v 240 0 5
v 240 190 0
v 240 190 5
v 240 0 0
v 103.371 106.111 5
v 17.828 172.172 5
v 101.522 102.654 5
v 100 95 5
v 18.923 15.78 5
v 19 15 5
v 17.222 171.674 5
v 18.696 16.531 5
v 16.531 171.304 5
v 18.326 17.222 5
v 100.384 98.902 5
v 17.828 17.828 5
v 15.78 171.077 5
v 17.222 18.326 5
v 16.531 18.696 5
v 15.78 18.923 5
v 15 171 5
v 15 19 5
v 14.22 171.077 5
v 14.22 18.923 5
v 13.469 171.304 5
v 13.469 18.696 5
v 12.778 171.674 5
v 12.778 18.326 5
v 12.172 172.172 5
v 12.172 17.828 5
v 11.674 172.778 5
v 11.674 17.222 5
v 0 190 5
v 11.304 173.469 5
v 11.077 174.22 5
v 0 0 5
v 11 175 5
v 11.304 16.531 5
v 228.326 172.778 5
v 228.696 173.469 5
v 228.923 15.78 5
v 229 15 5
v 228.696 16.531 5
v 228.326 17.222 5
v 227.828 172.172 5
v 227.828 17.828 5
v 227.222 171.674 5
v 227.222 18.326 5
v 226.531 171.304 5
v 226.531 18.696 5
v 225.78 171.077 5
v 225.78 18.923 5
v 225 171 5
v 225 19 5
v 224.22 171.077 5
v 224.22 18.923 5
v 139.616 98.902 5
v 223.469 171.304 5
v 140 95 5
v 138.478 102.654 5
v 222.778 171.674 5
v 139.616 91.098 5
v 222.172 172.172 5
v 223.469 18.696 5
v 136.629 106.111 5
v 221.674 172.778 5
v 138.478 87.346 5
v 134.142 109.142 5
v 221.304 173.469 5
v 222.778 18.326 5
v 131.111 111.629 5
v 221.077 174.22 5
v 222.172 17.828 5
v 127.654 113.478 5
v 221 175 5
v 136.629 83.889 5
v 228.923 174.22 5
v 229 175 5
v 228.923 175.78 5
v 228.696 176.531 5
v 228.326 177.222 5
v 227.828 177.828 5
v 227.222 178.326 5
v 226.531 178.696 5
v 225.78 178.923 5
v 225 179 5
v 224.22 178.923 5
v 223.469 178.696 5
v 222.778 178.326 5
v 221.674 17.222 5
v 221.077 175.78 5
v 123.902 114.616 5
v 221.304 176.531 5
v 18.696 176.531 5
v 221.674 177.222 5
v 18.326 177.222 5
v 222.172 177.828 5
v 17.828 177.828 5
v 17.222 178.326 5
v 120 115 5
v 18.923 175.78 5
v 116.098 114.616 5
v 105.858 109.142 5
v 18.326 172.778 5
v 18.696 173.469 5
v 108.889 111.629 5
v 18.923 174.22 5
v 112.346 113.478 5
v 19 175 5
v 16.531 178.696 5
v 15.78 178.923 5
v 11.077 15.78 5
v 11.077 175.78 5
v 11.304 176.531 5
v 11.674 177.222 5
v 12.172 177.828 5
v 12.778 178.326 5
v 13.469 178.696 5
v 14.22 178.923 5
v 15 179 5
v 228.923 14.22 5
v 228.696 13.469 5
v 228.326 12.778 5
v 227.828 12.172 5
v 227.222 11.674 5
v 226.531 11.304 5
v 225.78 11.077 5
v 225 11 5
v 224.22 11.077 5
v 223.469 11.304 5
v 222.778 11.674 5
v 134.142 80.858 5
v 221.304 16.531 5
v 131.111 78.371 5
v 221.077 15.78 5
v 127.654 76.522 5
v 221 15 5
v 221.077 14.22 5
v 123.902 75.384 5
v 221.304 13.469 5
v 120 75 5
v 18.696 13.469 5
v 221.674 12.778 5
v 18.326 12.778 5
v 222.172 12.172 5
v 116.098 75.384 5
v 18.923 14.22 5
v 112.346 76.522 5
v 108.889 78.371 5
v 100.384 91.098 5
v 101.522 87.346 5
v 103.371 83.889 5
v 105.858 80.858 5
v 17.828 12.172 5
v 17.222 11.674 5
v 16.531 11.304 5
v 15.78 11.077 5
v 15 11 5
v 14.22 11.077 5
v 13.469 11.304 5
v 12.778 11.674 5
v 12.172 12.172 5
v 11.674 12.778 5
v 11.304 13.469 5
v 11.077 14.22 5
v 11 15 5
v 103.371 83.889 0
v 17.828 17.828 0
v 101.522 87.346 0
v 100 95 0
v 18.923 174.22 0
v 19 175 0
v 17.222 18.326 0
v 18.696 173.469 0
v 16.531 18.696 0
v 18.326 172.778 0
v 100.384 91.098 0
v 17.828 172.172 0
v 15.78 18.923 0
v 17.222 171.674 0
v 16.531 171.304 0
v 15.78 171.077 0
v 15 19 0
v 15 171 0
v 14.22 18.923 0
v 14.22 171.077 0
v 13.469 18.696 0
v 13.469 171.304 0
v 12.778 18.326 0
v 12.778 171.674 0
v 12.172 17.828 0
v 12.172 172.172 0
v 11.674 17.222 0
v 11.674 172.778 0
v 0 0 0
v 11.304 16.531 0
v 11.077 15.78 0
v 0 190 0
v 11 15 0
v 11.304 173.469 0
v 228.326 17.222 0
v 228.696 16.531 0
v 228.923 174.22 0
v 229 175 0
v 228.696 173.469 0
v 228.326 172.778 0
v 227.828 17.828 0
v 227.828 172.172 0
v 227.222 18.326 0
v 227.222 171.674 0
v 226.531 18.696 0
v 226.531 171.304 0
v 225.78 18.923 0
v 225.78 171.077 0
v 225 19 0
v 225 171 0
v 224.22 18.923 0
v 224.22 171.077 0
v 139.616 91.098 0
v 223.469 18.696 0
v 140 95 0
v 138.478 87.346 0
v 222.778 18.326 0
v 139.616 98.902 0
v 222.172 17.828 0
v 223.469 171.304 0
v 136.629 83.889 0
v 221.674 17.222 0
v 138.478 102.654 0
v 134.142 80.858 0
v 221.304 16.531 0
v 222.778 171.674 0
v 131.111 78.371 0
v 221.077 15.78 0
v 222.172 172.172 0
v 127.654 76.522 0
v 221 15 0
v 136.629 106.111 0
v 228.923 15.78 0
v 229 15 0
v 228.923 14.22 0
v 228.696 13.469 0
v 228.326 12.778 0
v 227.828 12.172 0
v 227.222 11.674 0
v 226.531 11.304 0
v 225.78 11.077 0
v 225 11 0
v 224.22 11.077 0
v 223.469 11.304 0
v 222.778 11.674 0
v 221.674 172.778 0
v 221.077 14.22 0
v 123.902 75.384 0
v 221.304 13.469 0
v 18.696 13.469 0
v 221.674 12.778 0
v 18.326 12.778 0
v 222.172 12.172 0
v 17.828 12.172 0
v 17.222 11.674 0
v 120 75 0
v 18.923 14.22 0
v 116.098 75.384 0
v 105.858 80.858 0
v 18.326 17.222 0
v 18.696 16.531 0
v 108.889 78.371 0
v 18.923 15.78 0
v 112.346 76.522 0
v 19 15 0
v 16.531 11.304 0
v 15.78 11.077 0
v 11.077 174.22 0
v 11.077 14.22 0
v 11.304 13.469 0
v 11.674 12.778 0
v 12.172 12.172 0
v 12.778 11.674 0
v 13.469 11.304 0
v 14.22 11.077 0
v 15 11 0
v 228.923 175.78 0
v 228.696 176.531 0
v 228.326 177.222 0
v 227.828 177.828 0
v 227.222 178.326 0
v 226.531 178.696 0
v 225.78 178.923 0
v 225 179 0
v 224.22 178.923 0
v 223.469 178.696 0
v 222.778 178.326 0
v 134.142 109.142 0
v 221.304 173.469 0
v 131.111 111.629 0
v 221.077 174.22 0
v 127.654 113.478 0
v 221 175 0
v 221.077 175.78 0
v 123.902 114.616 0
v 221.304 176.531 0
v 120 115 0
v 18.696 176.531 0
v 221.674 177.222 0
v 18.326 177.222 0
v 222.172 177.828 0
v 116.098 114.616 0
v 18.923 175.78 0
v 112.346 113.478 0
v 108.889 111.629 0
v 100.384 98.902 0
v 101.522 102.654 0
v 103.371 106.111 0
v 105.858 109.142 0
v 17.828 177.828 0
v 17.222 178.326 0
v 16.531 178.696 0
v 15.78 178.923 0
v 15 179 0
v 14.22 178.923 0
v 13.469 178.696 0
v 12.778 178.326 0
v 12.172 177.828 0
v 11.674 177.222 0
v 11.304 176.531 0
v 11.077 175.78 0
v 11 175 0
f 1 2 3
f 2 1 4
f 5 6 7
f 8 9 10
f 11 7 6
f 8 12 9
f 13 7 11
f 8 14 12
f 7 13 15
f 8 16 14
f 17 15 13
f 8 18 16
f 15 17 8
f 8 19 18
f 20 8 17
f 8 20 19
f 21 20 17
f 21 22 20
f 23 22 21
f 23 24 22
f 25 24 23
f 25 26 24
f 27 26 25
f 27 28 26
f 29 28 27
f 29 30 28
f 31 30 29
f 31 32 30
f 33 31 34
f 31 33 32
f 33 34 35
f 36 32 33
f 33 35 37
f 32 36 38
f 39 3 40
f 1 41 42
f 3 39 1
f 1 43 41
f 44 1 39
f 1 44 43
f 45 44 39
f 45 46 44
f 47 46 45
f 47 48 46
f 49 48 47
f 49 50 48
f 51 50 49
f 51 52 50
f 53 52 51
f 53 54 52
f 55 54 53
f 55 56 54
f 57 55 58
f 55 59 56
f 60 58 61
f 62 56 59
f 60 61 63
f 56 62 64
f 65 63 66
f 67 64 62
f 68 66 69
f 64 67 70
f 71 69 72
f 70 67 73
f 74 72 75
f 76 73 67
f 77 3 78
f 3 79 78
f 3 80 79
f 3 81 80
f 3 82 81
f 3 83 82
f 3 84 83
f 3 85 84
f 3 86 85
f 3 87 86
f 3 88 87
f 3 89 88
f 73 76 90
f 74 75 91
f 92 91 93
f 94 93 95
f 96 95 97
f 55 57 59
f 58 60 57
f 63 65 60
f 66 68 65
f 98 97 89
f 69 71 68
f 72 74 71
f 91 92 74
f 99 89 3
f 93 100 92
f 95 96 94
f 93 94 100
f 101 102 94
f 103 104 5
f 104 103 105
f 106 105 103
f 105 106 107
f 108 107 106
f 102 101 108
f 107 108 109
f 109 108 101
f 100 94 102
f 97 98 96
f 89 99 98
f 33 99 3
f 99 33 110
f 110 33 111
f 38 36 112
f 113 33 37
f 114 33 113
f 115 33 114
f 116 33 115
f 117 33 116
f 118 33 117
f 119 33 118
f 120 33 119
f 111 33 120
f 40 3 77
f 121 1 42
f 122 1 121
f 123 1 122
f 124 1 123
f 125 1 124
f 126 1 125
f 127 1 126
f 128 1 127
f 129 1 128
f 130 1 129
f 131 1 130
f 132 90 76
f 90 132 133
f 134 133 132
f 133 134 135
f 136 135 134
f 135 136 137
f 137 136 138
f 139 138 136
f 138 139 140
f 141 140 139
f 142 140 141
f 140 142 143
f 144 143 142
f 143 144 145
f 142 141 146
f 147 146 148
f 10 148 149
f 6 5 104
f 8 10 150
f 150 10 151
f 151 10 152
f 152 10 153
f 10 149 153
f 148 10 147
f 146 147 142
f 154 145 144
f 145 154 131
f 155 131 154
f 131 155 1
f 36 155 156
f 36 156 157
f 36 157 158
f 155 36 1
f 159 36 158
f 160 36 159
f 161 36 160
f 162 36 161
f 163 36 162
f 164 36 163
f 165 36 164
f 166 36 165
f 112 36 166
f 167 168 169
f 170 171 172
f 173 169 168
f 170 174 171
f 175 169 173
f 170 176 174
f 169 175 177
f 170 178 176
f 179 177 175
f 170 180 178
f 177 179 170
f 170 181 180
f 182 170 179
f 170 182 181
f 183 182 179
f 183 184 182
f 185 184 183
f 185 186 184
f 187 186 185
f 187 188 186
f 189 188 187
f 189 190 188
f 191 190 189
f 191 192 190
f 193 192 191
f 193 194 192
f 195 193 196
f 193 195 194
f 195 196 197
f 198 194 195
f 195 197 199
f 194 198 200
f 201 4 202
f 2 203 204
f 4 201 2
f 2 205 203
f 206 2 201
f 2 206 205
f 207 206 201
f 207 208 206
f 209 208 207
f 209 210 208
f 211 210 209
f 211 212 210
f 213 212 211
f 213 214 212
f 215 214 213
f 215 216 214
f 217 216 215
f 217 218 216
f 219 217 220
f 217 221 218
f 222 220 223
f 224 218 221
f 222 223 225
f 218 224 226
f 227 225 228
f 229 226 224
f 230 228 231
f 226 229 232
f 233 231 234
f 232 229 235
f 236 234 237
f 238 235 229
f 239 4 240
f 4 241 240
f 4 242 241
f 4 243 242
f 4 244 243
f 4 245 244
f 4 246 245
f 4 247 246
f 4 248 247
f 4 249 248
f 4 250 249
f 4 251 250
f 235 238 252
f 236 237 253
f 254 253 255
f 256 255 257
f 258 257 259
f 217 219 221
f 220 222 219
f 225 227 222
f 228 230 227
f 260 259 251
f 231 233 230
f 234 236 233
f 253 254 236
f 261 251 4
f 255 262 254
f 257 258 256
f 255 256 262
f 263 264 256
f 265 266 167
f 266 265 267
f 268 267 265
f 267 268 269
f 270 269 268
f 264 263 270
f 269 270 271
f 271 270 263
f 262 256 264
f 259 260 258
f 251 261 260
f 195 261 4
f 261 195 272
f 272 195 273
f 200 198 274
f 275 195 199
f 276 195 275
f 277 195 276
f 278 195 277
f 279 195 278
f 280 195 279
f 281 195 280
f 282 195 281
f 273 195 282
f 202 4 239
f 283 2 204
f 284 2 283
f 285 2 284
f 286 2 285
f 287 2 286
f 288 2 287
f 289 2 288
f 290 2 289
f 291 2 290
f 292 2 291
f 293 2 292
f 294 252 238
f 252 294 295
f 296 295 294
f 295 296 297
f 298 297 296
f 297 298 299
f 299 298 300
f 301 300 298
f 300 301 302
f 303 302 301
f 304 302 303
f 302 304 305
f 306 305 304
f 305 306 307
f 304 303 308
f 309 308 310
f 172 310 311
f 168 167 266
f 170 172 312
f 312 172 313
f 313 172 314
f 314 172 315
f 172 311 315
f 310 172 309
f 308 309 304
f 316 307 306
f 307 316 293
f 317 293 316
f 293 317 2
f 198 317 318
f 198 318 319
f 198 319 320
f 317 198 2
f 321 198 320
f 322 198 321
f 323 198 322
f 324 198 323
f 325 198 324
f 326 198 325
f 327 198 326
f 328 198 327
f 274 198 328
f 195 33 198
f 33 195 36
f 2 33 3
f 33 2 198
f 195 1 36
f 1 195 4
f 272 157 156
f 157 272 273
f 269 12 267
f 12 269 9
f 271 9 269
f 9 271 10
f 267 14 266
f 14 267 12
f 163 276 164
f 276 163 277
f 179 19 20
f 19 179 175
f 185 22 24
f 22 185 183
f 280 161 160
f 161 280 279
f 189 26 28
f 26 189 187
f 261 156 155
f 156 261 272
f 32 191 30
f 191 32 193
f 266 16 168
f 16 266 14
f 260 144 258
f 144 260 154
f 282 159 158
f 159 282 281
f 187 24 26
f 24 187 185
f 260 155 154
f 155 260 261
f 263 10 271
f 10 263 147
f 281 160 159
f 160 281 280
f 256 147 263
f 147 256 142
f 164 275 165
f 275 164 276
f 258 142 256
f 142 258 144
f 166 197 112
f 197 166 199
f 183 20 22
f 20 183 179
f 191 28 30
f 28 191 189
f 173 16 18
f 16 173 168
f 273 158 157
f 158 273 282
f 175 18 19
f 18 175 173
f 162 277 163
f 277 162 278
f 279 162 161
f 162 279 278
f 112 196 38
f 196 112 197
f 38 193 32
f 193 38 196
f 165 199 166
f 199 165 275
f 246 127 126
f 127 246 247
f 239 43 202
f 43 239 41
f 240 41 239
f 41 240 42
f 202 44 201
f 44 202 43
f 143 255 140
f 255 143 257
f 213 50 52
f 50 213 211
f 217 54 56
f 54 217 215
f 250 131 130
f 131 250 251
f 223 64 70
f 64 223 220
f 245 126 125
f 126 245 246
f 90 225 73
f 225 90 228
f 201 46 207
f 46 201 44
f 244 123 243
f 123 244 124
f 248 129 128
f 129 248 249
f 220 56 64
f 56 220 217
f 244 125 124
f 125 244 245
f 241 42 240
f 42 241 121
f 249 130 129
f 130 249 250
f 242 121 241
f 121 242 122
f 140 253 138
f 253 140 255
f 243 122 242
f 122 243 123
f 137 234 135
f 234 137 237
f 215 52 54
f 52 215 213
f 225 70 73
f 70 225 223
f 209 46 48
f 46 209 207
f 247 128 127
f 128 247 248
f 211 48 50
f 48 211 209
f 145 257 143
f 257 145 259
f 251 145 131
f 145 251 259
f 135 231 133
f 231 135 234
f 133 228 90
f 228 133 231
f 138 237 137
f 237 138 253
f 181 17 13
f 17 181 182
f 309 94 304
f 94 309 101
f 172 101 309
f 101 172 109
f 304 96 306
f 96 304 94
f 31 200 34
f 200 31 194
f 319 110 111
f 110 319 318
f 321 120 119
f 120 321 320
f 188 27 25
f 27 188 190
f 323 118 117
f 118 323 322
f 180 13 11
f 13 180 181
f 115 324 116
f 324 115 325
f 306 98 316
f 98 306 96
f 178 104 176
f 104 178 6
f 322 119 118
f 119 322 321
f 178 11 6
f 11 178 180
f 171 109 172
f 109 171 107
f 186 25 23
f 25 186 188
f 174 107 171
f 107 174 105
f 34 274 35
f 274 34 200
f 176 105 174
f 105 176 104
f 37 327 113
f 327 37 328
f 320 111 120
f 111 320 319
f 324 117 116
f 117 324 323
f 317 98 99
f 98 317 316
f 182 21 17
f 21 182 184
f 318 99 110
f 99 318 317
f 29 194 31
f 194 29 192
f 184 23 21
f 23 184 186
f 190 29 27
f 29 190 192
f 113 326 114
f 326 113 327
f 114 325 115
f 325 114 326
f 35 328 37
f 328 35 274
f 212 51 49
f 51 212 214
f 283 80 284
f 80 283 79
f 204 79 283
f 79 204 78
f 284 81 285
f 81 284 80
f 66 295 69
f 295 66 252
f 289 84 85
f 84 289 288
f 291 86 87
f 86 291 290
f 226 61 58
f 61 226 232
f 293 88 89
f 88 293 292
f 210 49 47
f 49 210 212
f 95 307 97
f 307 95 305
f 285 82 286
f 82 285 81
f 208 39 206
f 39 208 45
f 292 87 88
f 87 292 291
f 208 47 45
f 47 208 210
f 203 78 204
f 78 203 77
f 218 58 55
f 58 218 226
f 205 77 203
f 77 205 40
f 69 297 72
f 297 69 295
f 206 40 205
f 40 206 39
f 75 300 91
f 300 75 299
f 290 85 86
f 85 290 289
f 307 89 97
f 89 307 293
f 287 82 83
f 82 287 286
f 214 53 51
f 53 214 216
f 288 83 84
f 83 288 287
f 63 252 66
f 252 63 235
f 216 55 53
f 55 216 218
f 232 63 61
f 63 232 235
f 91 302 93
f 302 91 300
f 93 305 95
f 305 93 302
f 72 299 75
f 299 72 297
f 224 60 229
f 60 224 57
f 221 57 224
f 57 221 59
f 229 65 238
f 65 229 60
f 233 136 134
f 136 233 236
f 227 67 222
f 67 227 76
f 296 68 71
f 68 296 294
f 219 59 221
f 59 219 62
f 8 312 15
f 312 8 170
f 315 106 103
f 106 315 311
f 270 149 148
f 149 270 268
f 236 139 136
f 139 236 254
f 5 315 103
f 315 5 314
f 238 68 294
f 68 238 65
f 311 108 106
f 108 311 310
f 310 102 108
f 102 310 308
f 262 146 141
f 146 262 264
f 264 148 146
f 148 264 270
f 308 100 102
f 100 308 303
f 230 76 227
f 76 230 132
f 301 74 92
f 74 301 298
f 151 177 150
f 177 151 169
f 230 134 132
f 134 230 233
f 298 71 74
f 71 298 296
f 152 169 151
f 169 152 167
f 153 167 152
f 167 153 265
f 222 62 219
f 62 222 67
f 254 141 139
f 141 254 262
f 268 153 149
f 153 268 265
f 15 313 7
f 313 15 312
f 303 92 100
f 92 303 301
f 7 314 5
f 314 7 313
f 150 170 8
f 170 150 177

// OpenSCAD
$fn = 32;

// ----------------------------------------------------------------------
// Big plate: 200-250 mm adapter plate
// ----------------------------------------------------------------------

// --- parameters (mm) ---
plate_l = 240;            // plate length, X
plate_w = 190;            // plate width, Y
plate_t = 5;              // plate thickness, Z
corner_d = 8;             // corner hole diameter
corner_in = 15;           // corner hole inset from the edges
bore_d = 40;              // central bore

difference() {
  cube([plate_l, plate_w, plate_t]);
  translate([corner_in, corner_in, -1]) cylinder(h = plate_t + 2, d = corner_d);
  translate([plate_l - corner_in, corner_in, -1]) cylinder(h = plate_t + 2, d = corner_d);
  translate([corner_in, plate_w - corner_in, -1]) cylinder(h = plate_t + 2, d = corner_d);
  translate([plate_l - corner_in, plate_w - corner_in, -1]) cylinder(h = plate_t + 2, d = corner_d);
  translate([plate_l / 2, plate_w / 2, -1]) cylinder(h = plate_t + 2, d = bore_d);
}
